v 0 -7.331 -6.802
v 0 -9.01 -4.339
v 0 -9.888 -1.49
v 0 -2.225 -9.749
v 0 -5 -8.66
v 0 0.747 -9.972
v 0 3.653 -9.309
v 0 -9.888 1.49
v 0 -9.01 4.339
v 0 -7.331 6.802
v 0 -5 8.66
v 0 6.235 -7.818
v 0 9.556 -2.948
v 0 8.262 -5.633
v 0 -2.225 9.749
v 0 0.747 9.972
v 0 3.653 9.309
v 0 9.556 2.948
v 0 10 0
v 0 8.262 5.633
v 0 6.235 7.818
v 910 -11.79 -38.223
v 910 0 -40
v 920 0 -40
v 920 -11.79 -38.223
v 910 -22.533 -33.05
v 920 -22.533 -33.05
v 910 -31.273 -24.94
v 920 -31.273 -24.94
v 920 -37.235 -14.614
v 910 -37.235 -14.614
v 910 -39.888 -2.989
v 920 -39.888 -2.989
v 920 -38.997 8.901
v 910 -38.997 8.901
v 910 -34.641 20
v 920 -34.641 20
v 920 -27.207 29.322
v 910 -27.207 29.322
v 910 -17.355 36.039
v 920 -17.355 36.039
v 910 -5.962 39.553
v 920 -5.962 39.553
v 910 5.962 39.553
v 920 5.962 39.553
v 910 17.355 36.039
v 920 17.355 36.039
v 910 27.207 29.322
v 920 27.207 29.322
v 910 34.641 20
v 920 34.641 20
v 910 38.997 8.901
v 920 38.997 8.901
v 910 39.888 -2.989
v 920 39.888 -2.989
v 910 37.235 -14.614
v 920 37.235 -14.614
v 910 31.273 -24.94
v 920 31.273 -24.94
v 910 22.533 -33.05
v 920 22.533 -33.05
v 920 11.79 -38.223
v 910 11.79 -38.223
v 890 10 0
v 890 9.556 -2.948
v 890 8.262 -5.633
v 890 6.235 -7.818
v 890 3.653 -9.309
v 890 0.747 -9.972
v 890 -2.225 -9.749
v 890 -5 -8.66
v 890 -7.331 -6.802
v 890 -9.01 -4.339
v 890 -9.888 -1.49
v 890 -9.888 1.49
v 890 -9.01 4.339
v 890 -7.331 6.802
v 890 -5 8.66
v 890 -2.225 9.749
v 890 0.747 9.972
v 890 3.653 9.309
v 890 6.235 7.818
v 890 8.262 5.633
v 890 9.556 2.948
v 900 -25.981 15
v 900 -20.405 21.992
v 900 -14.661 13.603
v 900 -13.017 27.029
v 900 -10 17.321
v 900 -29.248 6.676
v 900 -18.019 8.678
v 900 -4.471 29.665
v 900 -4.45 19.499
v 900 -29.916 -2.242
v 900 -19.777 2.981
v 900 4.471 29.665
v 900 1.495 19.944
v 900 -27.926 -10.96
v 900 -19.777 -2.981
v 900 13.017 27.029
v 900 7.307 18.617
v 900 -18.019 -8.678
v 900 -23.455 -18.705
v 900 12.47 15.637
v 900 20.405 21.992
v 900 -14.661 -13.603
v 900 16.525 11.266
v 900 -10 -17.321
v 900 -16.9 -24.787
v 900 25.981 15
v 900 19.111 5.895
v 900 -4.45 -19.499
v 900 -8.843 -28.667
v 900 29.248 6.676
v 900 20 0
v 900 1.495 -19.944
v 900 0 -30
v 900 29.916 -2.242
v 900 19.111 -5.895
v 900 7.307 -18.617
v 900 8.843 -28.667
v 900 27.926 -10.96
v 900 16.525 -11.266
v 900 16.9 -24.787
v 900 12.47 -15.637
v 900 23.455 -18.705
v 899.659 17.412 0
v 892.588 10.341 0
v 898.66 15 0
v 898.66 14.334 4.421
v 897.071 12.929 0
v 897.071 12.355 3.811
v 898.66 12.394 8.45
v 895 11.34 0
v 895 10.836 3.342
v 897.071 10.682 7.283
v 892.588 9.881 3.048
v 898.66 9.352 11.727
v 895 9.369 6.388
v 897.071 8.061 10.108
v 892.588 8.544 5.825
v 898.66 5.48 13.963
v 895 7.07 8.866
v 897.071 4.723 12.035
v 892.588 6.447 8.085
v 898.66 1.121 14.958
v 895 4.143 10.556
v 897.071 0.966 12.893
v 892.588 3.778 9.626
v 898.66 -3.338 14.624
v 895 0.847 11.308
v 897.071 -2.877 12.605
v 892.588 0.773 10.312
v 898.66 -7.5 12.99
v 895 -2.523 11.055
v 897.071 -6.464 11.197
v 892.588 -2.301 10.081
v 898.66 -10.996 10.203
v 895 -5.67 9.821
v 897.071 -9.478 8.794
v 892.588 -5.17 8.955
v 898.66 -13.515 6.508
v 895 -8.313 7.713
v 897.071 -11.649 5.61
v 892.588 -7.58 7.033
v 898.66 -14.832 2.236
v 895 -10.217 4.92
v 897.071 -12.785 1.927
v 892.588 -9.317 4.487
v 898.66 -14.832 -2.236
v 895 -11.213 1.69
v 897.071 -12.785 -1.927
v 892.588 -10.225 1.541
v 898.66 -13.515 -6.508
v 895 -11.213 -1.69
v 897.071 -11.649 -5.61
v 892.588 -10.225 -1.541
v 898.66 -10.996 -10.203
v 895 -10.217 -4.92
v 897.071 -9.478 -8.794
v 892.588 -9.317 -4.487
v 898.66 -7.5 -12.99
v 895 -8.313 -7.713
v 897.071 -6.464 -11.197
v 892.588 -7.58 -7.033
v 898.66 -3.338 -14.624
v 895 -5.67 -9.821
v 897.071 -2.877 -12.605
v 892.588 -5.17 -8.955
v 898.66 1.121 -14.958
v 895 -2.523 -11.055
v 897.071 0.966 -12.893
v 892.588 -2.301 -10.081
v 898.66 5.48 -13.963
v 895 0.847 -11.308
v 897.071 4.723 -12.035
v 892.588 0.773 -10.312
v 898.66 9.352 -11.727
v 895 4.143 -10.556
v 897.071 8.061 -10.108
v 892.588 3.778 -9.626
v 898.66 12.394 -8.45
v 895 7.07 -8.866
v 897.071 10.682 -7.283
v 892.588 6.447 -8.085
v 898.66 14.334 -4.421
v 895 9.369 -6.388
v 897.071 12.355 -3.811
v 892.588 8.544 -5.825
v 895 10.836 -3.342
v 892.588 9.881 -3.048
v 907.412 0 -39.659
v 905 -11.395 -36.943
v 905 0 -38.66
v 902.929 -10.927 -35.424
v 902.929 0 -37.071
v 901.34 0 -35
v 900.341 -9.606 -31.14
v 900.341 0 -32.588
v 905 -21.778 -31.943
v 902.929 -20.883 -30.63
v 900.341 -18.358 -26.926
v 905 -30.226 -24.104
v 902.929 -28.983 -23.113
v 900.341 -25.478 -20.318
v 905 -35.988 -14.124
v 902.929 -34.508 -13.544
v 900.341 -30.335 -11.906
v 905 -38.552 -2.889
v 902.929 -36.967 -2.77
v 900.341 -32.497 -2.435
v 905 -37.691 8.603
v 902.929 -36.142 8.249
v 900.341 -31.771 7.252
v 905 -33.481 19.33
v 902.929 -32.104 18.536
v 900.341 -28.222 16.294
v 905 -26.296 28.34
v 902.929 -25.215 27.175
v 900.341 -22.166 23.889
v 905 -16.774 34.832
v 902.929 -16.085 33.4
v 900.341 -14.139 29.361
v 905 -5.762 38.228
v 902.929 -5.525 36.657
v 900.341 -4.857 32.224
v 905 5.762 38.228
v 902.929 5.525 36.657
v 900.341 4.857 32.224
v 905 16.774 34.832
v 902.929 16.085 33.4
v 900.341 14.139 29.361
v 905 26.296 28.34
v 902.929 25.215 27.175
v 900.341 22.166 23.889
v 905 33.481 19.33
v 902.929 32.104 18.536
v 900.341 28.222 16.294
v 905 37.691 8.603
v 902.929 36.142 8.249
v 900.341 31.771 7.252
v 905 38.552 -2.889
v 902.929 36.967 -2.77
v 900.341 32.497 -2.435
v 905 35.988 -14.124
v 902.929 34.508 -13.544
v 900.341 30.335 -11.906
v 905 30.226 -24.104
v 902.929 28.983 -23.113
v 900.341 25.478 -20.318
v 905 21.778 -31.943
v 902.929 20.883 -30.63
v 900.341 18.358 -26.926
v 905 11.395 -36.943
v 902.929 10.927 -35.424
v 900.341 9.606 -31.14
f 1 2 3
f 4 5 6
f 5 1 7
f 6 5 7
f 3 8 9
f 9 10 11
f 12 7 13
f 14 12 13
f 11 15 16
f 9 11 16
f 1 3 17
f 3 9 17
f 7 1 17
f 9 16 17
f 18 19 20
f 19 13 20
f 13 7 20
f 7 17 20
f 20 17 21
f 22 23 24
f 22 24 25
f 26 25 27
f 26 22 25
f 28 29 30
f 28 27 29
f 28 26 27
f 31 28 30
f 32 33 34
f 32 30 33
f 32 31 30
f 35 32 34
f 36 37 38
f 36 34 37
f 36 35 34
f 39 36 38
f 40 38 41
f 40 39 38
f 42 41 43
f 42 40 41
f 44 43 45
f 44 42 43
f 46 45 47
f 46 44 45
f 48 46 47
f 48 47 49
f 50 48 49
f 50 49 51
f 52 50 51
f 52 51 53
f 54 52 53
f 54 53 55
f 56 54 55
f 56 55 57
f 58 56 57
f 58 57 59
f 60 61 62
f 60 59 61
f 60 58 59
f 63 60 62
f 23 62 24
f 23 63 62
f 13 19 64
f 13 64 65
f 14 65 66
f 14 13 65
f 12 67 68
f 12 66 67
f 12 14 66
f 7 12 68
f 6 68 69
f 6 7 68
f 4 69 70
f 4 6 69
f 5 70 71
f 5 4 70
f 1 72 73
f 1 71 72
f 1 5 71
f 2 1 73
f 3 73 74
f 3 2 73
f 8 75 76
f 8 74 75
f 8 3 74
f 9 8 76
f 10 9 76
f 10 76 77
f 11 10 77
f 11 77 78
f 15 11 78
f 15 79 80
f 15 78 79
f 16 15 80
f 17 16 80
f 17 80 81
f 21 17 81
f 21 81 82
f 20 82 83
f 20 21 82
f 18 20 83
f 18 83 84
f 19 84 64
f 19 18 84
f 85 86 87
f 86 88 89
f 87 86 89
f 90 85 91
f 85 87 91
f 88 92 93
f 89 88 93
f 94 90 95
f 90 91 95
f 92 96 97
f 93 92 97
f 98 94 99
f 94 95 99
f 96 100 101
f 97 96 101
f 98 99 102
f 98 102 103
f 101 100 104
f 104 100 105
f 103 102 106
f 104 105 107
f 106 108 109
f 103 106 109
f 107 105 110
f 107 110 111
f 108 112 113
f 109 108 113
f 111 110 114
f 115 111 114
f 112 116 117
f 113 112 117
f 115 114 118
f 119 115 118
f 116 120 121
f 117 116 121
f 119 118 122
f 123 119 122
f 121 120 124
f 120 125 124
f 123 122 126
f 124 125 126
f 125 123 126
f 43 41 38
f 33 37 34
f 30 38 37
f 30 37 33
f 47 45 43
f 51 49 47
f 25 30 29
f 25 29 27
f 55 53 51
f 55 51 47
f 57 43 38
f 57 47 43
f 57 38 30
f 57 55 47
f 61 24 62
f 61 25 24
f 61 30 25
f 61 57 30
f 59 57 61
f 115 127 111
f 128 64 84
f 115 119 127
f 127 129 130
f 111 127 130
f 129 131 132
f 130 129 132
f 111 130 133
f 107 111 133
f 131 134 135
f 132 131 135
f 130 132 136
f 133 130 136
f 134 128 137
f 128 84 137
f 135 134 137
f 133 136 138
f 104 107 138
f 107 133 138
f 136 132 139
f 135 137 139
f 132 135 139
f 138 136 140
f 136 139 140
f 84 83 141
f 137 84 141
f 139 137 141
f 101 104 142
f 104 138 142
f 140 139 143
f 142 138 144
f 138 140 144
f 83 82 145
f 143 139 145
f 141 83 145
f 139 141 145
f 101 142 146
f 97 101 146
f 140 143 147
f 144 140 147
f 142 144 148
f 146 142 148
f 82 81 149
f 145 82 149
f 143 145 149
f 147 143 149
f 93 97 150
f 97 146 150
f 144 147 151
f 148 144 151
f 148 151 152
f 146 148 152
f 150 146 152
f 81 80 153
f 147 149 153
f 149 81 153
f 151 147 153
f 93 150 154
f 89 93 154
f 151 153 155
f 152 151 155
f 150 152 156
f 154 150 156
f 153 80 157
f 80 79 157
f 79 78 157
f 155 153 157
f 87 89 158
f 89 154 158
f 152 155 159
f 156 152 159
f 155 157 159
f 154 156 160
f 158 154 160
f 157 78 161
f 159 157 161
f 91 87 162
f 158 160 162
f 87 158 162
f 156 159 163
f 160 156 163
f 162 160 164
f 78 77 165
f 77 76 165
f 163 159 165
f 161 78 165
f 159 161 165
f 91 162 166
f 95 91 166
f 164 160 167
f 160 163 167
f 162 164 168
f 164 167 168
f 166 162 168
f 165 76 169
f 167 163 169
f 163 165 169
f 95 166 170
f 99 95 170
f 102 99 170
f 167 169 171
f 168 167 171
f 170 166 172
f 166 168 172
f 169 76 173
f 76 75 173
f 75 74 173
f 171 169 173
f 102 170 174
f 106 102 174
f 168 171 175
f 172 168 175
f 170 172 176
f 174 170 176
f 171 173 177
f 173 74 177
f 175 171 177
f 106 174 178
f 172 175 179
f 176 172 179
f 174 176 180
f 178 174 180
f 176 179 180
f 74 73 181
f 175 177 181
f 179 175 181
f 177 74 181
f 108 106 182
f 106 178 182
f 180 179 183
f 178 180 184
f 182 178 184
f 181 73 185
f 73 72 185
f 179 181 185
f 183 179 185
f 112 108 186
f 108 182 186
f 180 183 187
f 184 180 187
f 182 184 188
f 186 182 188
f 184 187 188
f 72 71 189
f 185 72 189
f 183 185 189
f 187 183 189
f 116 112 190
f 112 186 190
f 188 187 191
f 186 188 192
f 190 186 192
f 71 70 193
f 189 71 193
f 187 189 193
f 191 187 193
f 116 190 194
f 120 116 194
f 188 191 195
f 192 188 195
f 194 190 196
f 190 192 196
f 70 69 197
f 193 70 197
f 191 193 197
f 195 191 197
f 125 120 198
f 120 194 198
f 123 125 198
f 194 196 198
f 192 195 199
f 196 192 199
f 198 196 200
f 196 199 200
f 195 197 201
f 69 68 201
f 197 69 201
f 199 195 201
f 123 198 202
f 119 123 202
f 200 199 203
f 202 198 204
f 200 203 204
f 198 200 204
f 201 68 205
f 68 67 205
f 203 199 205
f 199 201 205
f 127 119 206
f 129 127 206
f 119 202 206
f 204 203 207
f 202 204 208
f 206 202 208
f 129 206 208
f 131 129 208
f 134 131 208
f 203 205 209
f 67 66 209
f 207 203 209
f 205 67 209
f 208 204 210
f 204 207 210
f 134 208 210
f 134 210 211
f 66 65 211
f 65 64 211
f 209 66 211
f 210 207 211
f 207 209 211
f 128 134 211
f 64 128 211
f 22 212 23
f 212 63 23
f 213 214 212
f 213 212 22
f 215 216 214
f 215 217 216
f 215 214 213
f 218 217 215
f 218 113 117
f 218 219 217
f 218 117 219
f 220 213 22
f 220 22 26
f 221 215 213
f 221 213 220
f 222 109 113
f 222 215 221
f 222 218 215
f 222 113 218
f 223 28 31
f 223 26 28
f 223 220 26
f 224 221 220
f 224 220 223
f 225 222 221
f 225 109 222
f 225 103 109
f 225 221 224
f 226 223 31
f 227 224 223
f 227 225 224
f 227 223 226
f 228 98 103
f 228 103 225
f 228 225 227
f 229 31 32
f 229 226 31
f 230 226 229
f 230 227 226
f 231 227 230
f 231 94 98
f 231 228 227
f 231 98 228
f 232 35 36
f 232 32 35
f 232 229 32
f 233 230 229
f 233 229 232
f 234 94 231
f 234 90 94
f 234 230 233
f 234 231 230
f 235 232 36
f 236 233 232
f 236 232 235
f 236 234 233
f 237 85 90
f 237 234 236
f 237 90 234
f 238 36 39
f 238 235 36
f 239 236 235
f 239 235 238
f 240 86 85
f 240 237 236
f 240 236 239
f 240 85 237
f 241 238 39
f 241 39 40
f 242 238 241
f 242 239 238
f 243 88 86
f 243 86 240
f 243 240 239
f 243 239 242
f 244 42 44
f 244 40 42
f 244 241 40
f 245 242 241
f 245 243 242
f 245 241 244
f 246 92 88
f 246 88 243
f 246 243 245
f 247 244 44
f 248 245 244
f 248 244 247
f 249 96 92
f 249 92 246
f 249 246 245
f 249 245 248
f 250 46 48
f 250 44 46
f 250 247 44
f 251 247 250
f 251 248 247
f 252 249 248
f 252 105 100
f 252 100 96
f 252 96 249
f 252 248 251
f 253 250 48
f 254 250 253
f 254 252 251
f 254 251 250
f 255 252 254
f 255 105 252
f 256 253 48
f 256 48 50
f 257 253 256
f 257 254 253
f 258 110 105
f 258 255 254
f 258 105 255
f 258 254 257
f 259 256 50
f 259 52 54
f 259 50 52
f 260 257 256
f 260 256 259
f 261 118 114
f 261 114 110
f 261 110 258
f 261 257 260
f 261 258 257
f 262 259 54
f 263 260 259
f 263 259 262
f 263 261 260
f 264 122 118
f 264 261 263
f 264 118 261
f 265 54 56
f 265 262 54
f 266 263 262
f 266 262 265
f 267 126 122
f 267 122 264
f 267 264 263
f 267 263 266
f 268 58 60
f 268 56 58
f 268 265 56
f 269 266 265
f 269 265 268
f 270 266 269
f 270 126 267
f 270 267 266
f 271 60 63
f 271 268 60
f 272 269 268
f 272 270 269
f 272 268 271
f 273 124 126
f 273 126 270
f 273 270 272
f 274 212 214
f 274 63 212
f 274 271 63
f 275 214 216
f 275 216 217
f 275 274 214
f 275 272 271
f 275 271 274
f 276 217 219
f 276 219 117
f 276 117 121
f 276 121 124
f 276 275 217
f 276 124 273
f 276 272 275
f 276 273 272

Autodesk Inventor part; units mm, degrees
ref_plane "YZ Plane" through (0, 0, 0) normal (1, 0, 0) x (0, 1, 0)
ref_plane "XZ Plane" through (0, 0, 0) normal (0, 1, 0) x (-1, 0, 0)
ref_plane "XY Plane" through (0, 0, 0) normal (0, 0, 1) x (1, 0, 0)
sketch "Sketch1" plane through (0, 0, 0) normal (1, 0, 0) x (0, 1, 0)
  circle A0 centre (0, 0) radius 10
  dimension "d0" = 20
extrude "Extrusion1" add sketch "Sketch1" along normal blind 900
sketch "Sketch2" plane through (900, 0, 0) normal (1, 0, 0) x (0, 0, -1)
  circle A0 centre (0, 0) radius 40
  dimension "d3" = 80
extrude "Extrusion2" add sketch "Sketch2" along normal blind 20
fillet "Fillet1" radius 10 1 edges at (900, 0, 40)
fillet "Fillet2" radius 10 1 edges at (900, -10, 0)
properties part number "pneumatic_cylinder_assembly" material "Stainless Steel"
